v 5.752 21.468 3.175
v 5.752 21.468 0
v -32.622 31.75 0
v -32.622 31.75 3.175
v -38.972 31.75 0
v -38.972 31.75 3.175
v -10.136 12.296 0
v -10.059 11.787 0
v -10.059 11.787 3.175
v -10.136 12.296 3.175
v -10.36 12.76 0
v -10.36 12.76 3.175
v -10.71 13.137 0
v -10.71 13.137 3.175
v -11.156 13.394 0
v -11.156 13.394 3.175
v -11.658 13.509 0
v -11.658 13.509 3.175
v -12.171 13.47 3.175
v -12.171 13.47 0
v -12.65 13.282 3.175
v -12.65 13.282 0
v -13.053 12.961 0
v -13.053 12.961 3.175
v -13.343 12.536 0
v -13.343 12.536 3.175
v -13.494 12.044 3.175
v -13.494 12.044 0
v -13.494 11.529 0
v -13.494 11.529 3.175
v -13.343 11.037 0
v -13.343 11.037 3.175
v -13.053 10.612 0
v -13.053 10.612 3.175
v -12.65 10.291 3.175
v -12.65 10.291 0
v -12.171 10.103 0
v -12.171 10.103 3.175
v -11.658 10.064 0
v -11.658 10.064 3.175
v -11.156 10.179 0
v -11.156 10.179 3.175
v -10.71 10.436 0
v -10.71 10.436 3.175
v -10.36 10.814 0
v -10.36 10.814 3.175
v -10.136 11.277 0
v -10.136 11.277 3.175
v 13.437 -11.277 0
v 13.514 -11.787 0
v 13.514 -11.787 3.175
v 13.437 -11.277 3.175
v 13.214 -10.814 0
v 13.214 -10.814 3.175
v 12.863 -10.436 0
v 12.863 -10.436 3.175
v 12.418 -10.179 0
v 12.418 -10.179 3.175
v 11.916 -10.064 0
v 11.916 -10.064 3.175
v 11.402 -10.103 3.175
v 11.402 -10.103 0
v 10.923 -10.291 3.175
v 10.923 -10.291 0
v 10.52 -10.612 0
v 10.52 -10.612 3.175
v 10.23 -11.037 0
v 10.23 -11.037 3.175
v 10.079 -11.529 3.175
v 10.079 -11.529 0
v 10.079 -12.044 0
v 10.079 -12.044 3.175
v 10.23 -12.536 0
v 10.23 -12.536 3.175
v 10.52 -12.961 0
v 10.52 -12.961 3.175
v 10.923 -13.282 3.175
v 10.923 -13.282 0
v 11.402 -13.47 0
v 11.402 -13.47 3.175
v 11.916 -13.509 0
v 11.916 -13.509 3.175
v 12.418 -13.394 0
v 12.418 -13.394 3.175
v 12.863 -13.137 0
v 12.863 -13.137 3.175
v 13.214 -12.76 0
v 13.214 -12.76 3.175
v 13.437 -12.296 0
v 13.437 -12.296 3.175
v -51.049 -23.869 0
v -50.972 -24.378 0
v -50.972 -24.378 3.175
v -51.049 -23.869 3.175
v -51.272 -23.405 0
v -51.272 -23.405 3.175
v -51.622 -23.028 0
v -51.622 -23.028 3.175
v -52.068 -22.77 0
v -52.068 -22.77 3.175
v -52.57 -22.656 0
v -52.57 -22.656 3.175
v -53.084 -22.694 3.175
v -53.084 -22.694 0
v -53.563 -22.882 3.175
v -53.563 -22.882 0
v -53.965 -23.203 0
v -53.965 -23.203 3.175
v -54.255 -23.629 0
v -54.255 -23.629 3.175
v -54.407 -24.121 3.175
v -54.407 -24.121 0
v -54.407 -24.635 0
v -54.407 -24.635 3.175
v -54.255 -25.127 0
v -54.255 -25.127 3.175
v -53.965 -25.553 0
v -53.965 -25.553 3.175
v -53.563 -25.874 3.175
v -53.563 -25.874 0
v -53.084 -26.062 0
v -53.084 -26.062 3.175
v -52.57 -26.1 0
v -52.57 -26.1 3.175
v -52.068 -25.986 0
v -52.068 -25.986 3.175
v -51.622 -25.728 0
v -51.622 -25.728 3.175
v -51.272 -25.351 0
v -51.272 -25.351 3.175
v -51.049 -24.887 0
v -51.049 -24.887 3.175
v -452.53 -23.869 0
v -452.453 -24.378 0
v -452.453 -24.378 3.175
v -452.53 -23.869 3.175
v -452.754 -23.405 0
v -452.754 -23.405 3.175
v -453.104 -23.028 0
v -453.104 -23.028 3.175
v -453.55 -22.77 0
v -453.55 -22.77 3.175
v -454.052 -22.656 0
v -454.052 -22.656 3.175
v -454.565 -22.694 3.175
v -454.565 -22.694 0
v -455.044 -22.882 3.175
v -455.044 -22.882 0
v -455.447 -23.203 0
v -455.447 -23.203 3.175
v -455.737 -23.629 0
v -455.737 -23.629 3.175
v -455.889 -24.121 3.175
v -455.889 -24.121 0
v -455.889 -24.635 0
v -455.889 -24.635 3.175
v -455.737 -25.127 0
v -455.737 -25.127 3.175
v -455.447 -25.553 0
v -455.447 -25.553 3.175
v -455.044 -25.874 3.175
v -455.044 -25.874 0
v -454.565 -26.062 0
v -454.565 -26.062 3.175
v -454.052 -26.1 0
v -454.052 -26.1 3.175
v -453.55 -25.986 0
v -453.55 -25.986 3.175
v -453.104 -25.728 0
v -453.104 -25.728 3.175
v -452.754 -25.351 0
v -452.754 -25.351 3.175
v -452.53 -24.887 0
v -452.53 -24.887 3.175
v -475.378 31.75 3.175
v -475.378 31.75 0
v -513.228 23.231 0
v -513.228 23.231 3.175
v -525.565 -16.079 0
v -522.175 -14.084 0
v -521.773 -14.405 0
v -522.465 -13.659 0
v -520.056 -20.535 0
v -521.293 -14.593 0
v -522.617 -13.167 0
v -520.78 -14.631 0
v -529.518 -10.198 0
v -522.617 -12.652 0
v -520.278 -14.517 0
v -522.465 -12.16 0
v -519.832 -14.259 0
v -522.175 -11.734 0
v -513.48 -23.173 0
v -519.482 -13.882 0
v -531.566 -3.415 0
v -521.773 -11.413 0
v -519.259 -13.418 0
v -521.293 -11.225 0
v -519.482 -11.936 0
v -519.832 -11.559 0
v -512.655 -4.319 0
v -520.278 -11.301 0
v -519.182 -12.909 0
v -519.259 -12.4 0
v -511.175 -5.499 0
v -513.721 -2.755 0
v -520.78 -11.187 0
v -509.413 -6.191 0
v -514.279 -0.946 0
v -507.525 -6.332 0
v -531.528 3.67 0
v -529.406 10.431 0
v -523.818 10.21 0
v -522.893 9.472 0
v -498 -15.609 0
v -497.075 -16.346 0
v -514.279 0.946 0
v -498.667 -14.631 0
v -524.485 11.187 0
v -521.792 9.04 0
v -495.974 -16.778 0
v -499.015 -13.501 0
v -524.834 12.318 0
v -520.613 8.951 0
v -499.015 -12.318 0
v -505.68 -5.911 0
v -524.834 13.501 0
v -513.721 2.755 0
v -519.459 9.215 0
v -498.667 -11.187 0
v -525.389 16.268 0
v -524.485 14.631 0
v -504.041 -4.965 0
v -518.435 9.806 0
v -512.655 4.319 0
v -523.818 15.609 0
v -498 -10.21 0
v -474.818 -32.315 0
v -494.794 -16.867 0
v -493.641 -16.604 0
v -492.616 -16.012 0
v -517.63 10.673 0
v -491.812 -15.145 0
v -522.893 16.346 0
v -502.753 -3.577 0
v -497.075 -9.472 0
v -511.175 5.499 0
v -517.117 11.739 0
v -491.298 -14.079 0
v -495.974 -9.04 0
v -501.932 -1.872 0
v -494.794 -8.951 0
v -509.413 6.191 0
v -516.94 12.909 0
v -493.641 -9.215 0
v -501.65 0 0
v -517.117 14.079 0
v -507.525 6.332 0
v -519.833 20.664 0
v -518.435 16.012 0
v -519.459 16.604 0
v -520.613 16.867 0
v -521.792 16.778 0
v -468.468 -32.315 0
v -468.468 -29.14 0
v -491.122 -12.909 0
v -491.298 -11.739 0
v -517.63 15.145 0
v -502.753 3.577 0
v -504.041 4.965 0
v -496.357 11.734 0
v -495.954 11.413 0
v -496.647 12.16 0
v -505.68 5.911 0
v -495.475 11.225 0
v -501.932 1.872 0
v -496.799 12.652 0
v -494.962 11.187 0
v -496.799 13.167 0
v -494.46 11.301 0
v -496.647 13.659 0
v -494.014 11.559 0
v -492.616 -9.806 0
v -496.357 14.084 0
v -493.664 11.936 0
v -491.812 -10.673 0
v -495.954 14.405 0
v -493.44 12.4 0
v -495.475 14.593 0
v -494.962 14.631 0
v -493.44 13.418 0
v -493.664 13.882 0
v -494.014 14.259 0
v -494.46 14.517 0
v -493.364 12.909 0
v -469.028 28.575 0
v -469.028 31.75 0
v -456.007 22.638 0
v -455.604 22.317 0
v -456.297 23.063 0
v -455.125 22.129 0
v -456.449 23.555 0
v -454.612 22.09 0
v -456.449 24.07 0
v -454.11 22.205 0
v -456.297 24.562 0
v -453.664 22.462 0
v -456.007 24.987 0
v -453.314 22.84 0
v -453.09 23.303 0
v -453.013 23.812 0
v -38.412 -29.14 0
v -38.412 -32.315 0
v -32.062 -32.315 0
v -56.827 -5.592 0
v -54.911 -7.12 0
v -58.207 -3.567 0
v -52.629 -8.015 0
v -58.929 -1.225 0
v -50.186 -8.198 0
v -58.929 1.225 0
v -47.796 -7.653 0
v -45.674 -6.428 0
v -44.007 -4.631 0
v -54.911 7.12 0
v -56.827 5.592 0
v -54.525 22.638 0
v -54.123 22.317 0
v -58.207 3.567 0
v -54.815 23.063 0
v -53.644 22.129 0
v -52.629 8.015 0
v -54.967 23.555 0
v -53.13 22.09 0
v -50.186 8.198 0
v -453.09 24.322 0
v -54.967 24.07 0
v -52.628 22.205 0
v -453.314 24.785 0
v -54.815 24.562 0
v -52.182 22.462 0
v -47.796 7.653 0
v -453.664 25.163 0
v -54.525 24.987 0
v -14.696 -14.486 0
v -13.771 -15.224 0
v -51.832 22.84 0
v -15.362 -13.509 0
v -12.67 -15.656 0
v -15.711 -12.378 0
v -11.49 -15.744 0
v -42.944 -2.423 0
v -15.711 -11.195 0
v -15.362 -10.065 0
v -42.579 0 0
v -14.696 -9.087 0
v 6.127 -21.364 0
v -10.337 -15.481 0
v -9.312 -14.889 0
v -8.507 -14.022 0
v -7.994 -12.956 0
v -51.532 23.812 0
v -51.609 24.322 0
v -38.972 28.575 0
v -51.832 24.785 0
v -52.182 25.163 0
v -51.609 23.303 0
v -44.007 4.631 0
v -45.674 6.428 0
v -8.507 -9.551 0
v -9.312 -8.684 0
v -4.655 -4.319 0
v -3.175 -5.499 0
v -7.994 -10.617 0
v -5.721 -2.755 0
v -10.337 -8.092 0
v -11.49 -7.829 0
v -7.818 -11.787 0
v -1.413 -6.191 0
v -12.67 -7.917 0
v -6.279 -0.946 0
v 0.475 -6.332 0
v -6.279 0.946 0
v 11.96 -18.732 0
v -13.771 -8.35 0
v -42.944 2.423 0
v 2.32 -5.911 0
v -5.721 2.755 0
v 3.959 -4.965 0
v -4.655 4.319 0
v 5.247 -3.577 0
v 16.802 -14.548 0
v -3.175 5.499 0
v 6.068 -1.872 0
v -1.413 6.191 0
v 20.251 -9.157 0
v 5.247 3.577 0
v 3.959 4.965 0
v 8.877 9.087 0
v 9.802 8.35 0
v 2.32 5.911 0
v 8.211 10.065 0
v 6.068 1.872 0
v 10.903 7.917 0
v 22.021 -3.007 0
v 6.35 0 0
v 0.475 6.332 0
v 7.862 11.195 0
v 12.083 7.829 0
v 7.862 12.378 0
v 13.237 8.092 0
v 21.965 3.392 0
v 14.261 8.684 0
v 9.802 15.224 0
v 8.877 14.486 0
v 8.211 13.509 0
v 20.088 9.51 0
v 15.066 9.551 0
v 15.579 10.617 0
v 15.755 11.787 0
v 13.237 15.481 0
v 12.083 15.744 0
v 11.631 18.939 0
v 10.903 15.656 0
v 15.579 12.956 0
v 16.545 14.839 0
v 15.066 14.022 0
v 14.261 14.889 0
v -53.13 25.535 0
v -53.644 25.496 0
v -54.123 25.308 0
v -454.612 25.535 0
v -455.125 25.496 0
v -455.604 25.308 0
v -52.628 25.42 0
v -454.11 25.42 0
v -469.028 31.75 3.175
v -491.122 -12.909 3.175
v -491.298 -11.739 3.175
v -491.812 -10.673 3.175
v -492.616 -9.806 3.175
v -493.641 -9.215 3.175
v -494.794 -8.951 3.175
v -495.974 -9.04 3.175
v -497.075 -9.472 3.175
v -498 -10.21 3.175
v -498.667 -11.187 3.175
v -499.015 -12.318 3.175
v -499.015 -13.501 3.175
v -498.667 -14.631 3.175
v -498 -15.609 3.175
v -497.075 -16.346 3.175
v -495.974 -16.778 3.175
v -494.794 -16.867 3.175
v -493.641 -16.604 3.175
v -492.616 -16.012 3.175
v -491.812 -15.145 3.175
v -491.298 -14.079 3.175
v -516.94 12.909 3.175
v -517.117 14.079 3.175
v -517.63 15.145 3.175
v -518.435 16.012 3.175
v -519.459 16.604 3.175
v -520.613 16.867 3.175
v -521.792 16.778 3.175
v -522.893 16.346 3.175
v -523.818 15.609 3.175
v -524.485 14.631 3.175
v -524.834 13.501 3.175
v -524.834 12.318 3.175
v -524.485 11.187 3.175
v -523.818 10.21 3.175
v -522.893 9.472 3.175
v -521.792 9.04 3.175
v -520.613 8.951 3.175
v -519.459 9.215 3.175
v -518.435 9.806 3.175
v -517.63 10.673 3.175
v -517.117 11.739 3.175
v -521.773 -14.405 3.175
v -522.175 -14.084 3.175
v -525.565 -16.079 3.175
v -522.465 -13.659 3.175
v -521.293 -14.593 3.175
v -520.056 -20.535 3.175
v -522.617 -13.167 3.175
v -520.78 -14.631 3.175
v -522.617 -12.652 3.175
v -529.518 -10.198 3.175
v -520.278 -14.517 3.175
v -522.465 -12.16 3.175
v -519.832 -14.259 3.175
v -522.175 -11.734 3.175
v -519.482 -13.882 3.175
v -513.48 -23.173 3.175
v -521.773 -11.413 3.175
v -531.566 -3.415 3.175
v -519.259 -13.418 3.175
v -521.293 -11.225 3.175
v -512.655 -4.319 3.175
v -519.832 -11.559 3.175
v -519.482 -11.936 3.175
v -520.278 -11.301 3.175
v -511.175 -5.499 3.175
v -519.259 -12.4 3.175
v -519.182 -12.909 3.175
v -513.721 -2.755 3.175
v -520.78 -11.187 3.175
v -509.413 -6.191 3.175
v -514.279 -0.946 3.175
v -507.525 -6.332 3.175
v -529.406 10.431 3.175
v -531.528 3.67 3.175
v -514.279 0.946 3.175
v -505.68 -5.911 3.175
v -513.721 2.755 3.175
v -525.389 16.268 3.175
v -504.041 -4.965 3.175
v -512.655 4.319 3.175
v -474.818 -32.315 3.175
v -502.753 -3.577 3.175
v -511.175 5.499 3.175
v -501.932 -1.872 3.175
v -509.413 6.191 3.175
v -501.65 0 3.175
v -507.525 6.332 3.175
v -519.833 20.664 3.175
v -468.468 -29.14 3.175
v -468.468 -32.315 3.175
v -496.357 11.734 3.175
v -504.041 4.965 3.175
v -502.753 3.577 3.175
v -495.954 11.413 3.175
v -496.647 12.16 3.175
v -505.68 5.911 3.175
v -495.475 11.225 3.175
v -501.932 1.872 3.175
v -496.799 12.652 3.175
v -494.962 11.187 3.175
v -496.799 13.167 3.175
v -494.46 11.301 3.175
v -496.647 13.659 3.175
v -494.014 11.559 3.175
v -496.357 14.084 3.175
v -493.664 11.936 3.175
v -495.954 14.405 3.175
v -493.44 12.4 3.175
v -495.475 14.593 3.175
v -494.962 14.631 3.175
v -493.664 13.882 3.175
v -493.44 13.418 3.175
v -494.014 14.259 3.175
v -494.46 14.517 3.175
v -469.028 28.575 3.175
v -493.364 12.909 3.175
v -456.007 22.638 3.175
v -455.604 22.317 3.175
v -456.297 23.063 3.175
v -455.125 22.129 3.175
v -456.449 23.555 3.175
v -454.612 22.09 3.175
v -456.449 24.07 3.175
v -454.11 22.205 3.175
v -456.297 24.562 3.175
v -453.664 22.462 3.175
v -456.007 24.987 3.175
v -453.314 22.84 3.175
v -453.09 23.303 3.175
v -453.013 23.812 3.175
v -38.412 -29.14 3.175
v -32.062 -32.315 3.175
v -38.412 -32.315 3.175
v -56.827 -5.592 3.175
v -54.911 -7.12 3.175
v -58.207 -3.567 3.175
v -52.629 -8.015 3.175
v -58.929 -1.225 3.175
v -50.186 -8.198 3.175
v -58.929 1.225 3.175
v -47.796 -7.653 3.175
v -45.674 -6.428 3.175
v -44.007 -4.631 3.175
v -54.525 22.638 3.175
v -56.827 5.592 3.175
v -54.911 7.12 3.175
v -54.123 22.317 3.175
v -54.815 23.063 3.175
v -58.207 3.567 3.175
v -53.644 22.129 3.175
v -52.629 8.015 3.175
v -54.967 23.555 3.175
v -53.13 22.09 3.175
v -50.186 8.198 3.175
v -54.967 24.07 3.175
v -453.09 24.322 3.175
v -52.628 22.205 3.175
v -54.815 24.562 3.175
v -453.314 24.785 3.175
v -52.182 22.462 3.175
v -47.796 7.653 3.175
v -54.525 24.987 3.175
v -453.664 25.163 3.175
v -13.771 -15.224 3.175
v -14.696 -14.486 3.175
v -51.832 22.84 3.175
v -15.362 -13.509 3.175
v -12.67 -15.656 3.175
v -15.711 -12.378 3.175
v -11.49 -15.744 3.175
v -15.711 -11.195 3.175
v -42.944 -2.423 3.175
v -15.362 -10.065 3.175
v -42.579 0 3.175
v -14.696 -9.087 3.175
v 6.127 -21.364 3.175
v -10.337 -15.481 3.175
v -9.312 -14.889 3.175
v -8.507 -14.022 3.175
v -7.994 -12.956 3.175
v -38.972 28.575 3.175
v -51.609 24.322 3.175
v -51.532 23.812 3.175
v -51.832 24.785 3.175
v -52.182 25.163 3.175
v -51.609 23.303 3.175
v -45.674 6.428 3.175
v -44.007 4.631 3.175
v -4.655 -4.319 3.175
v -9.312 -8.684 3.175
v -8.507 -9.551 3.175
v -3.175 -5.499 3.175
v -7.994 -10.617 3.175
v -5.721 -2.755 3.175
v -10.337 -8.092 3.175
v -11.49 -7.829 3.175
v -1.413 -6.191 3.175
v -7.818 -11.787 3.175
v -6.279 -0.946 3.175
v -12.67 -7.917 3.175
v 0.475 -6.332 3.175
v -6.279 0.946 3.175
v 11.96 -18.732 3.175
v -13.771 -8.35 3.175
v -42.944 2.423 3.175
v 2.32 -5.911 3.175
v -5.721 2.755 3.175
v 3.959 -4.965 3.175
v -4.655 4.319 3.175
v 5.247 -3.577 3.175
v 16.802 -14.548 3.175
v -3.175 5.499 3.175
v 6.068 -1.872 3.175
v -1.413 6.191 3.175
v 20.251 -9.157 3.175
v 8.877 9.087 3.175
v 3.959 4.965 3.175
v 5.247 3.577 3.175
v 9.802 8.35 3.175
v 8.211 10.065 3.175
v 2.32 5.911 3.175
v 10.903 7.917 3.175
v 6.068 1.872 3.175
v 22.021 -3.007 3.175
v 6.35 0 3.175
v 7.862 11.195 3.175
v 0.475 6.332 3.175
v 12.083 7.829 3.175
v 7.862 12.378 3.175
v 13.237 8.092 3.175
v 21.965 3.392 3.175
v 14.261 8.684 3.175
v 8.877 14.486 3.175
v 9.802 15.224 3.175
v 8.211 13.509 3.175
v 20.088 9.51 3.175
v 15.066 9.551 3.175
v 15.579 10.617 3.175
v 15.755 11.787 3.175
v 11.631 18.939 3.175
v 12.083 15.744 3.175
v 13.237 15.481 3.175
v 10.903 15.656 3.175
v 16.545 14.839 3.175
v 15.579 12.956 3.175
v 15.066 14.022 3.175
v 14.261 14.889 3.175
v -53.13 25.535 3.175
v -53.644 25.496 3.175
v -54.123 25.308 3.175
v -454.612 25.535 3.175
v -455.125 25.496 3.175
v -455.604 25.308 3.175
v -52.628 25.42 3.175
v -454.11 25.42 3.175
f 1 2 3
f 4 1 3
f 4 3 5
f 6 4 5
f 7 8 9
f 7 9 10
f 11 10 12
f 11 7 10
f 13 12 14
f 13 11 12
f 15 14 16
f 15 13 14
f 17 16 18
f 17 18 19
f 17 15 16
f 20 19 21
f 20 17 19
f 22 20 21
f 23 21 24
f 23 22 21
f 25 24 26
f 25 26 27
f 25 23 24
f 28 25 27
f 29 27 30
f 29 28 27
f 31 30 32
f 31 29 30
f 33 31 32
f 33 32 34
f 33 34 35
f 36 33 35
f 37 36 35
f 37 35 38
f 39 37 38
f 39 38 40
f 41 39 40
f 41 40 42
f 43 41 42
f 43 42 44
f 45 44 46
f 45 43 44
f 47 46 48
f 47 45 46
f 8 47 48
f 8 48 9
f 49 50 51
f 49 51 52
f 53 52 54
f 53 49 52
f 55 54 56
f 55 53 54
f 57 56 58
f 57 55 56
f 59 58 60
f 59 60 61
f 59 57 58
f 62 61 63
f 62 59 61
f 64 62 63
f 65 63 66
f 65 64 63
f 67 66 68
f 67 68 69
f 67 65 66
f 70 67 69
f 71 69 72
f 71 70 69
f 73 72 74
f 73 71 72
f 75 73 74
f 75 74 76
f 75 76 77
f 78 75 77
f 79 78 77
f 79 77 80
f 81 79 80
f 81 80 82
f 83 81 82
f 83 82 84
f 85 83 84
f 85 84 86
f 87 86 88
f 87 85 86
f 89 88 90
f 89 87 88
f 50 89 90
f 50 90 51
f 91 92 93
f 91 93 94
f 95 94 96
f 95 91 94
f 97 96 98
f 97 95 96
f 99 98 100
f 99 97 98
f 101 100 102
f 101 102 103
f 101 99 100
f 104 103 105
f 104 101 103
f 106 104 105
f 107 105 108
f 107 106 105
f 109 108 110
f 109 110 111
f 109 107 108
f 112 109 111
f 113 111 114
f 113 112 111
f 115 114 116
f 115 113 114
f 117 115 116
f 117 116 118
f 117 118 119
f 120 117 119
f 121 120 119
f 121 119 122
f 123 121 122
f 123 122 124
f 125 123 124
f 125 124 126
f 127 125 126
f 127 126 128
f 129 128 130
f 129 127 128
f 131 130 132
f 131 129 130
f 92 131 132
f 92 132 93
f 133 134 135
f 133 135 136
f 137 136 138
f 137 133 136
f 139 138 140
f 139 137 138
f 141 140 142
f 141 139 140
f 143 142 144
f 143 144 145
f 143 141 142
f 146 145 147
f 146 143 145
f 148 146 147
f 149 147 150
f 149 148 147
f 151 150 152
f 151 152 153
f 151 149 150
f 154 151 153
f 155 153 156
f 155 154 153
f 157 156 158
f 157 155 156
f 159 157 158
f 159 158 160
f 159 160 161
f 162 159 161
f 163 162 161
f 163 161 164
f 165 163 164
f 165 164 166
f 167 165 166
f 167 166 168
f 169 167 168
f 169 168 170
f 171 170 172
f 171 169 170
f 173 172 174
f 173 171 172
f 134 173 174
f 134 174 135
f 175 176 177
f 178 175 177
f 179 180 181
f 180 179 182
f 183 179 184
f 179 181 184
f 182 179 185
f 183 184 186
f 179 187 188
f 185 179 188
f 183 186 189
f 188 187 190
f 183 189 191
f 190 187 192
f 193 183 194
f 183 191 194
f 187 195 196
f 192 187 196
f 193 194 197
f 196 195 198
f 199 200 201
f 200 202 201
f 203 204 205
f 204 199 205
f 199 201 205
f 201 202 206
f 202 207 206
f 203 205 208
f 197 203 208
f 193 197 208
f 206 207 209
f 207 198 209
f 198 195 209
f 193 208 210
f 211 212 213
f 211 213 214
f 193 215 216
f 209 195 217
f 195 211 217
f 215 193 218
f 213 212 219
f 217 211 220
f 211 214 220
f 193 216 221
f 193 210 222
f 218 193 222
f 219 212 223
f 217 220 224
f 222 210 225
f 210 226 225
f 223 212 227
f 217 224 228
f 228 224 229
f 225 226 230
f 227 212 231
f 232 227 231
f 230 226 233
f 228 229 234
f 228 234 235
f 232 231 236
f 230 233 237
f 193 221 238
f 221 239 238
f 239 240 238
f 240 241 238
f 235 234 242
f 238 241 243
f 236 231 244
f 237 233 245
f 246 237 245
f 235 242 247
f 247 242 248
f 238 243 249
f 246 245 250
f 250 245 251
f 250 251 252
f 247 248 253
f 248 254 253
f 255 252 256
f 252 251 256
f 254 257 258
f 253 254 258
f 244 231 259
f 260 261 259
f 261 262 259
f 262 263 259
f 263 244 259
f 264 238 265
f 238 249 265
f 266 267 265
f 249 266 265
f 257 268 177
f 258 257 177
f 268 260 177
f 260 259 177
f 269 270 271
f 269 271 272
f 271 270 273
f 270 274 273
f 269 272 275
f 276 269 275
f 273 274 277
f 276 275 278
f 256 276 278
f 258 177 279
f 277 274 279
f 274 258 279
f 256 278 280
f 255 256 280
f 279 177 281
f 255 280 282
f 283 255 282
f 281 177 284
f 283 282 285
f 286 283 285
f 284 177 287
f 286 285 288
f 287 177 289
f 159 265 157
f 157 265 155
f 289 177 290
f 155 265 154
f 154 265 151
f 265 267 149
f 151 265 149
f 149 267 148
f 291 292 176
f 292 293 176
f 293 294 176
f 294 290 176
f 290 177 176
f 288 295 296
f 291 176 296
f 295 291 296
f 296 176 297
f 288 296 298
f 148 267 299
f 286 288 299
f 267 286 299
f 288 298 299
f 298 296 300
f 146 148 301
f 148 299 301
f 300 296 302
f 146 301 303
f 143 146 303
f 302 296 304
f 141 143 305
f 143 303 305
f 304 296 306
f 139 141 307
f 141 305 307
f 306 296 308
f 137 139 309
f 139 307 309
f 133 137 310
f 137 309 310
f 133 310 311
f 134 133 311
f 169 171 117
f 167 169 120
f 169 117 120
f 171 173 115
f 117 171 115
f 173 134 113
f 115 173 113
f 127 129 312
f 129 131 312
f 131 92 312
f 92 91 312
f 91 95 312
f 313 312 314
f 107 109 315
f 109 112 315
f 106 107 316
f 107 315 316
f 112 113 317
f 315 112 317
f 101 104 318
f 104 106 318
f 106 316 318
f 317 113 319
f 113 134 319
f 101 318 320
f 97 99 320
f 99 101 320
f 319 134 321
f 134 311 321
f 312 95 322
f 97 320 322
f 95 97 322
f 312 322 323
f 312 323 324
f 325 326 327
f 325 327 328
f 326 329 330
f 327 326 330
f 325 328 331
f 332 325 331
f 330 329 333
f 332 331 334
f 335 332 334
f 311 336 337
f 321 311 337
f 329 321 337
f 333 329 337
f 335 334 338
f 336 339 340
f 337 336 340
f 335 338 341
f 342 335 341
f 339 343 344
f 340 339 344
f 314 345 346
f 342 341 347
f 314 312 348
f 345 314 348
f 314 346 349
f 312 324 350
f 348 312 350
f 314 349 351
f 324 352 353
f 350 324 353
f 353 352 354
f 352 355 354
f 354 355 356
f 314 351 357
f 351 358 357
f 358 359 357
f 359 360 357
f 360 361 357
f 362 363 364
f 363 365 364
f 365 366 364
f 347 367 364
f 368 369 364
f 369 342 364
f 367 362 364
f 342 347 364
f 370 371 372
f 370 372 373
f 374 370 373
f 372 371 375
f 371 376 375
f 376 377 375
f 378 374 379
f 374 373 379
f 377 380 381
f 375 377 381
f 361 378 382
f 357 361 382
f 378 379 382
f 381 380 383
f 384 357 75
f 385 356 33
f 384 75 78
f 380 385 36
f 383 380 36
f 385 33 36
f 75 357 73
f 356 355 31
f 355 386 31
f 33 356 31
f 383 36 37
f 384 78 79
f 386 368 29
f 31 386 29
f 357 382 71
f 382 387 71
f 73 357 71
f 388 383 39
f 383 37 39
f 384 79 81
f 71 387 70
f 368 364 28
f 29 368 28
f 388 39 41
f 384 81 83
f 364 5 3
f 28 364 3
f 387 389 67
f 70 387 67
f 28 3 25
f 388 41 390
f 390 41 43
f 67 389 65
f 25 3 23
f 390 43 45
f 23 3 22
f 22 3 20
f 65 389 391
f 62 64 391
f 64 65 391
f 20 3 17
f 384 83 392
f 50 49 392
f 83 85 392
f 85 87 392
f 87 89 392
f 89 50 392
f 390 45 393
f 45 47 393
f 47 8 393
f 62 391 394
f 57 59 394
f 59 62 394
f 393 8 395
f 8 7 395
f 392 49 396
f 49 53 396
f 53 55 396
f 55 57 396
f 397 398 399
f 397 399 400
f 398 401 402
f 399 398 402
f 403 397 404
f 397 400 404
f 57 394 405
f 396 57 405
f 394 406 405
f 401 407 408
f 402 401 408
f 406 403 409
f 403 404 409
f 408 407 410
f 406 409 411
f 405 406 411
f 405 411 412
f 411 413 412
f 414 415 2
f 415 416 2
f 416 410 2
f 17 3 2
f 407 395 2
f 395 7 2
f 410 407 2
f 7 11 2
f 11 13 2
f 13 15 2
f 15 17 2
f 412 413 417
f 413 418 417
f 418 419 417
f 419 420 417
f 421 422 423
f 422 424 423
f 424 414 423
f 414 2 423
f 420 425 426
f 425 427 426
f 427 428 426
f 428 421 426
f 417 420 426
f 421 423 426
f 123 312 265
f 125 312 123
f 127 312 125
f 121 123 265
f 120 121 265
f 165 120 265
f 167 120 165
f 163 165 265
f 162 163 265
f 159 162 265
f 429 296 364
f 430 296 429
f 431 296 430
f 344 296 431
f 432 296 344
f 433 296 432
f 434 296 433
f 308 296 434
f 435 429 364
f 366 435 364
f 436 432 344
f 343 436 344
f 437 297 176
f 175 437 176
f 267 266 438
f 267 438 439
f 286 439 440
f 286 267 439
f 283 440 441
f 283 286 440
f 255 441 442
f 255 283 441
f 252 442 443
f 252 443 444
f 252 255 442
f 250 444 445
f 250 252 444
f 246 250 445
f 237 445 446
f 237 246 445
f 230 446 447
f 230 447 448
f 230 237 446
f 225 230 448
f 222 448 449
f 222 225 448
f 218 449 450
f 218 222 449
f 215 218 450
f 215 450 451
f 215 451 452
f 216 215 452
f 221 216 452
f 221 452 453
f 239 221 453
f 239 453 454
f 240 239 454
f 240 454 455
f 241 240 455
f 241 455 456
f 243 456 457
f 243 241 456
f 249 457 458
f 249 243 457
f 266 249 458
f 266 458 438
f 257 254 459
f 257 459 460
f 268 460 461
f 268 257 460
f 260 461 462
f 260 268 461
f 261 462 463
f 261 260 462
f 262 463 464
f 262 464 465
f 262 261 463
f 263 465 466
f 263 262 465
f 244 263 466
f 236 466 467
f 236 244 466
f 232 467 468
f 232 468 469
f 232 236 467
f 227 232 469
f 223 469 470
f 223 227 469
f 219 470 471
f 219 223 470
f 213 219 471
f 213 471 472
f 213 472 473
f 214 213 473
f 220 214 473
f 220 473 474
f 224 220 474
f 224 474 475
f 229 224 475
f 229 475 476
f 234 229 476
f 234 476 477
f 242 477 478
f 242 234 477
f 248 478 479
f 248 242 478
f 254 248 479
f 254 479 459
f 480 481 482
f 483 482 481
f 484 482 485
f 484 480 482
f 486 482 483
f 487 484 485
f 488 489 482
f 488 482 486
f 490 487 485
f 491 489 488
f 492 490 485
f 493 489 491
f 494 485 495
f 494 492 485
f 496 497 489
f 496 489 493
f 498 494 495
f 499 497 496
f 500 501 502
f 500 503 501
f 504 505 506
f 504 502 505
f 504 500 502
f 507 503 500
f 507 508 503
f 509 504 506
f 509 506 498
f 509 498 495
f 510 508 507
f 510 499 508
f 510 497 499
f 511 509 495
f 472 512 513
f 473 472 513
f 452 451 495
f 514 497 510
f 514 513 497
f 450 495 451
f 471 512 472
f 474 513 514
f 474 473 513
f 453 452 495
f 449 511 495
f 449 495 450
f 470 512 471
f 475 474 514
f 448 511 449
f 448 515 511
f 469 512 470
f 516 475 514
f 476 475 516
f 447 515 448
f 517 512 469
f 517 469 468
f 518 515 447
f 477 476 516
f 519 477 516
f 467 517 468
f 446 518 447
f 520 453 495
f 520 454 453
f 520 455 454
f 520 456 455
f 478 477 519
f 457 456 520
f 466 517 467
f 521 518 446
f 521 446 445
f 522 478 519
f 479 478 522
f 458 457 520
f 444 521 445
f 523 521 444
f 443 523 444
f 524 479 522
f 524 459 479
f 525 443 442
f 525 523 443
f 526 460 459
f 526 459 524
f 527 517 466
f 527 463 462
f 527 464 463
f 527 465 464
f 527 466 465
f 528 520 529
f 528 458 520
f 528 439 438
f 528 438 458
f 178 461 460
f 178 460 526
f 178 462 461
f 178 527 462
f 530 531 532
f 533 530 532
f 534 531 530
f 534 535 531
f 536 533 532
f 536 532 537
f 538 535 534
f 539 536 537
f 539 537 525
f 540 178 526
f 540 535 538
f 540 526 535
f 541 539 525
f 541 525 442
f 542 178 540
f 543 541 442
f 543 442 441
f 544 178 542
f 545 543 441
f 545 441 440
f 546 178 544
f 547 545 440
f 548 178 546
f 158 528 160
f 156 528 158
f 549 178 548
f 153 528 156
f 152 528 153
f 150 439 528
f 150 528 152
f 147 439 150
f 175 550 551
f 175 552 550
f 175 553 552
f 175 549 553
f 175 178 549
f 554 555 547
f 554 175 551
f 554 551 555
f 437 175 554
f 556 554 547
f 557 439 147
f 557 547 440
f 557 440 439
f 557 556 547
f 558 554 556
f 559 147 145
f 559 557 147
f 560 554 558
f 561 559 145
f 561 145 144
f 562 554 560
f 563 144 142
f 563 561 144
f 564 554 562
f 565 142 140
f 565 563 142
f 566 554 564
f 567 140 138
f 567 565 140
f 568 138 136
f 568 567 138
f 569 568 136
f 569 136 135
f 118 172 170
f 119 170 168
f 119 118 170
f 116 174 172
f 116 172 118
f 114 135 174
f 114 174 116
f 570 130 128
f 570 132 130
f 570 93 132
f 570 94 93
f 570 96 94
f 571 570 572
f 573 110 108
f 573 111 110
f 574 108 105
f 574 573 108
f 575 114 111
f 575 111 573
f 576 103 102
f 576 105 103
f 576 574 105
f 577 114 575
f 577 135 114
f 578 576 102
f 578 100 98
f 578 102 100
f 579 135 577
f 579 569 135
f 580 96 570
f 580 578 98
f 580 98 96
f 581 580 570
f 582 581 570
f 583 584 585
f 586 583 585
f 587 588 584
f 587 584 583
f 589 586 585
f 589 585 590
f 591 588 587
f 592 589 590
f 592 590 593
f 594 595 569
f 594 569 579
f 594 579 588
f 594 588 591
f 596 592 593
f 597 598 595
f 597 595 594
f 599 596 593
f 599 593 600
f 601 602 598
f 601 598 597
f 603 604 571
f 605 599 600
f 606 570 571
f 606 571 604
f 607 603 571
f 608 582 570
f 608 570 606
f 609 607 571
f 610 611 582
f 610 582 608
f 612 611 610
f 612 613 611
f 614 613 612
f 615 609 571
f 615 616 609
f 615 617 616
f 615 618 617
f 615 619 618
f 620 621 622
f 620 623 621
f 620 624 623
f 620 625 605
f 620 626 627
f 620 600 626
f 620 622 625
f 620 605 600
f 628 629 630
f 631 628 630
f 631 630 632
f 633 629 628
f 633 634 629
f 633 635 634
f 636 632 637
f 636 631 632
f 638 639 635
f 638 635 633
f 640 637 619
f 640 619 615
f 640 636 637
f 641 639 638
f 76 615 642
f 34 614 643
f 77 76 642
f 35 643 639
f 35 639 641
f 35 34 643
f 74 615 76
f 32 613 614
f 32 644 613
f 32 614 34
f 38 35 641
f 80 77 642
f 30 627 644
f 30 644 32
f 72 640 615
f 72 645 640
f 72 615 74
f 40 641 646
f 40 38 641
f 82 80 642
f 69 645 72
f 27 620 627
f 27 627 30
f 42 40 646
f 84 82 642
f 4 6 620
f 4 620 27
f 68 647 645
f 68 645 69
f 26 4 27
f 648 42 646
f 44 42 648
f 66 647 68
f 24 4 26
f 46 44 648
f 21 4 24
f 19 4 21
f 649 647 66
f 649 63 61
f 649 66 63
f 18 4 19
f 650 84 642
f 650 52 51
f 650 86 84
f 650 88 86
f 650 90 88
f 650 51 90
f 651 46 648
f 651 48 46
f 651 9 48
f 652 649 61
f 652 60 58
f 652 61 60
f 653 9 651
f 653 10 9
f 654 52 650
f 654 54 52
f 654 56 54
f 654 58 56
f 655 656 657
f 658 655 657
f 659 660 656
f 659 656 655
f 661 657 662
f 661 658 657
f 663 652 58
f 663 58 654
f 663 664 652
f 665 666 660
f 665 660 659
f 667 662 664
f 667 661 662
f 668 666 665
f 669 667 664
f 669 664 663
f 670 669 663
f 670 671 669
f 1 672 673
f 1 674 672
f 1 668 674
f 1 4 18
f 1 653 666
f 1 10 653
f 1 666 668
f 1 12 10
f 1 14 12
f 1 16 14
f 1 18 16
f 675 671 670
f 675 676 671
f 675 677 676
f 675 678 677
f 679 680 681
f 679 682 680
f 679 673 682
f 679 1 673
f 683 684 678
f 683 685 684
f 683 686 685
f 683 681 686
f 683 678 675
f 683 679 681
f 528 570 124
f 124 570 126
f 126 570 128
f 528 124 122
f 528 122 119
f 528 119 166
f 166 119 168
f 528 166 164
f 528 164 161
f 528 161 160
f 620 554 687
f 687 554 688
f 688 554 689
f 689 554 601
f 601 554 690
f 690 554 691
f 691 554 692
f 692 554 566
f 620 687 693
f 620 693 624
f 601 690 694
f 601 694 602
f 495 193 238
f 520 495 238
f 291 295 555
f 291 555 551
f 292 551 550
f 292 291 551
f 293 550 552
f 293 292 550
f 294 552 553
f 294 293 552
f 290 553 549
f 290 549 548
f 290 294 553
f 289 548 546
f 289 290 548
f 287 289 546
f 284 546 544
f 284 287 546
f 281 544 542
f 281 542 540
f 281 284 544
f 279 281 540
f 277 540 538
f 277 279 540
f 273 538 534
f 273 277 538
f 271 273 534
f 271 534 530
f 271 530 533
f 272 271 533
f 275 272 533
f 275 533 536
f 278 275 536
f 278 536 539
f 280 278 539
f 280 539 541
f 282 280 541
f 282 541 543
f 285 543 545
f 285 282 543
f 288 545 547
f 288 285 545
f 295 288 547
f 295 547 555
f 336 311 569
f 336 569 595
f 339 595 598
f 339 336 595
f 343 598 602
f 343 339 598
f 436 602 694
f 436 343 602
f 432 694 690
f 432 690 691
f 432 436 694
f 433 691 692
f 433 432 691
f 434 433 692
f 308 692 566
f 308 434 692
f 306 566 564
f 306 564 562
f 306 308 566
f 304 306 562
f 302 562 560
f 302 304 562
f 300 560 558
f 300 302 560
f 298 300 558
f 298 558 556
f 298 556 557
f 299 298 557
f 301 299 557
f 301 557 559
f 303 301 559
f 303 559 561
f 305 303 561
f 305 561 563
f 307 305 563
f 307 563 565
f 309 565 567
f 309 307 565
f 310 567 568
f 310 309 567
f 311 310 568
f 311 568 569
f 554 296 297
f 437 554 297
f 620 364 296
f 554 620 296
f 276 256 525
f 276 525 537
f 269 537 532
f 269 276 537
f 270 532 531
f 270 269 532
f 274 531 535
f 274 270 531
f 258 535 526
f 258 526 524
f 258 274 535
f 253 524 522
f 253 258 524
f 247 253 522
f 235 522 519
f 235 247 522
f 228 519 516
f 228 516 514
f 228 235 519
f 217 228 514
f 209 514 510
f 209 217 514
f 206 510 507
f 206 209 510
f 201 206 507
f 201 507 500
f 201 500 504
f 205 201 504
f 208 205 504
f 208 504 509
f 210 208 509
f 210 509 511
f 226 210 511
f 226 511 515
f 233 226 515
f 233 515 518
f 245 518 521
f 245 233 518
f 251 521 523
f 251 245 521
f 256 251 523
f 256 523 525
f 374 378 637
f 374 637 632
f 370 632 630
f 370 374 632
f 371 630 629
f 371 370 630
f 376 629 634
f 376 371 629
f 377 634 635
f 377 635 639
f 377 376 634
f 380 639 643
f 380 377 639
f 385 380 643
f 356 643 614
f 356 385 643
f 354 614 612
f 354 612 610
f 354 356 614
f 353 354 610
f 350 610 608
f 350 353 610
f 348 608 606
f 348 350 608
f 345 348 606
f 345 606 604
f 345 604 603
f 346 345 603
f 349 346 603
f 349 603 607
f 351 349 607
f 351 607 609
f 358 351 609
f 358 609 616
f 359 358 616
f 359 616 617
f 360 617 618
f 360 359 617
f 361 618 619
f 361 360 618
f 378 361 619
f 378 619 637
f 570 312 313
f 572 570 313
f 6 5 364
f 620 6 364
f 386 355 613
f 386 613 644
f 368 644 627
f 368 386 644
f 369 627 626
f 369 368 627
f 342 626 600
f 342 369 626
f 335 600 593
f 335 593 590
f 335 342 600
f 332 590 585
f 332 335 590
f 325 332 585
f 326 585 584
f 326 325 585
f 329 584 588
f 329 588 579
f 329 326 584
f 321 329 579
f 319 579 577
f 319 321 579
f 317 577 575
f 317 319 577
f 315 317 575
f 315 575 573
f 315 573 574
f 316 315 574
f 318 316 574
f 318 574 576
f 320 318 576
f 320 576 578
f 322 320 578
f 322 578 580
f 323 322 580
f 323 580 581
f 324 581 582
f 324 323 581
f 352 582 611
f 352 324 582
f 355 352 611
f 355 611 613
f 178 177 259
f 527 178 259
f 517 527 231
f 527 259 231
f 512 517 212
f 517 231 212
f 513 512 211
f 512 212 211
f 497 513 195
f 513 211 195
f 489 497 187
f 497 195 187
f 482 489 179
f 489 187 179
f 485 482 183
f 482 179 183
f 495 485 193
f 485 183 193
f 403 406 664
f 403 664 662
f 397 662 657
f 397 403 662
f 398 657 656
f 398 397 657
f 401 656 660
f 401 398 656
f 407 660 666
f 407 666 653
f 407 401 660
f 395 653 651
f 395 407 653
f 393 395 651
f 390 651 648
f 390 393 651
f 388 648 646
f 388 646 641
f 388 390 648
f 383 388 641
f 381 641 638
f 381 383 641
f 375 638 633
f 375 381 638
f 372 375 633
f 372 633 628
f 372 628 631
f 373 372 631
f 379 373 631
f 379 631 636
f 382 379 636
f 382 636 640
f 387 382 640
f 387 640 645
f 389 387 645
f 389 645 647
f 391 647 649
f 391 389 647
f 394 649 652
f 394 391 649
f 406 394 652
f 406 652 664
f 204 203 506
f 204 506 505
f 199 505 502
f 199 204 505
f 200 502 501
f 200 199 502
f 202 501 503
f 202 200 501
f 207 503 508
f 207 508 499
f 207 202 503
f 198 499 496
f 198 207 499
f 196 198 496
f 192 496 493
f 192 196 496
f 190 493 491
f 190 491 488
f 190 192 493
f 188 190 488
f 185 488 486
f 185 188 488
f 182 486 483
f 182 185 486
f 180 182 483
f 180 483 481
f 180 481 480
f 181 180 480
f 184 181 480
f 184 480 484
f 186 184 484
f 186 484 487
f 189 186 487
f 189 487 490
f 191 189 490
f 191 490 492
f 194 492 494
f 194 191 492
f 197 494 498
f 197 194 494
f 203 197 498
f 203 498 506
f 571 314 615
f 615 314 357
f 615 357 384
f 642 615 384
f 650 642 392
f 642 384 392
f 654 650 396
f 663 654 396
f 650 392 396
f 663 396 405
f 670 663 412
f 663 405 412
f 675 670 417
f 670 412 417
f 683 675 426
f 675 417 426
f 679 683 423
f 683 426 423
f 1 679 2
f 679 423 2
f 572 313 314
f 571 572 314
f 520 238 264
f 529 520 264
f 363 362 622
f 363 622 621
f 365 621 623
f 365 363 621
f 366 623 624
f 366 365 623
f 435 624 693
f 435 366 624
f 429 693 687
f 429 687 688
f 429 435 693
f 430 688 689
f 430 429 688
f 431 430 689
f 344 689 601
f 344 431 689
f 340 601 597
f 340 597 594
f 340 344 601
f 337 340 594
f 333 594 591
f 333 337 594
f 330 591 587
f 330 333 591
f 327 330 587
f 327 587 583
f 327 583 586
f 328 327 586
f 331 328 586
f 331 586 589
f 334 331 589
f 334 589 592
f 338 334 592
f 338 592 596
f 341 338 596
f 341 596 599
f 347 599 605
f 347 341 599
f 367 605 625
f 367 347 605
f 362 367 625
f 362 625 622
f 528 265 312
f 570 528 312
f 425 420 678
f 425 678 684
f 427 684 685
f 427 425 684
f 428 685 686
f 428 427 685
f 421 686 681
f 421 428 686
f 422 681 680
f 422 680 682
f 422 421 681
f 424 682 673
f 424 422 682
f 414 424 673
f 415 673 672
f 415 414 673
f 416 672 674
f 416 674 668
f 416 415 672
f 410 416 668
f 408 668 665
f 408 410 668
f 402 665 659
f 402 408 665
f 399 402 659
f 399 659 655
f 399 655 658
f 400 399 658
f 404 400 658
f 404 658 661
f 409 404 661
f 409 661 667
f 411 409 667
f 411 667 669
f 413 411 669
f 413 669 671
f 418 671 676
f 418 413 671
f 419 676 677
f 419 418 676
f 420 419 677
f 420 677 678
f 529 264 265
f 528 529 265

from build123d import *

# Parameters (mm, degrees)
F0_R     = 1.7272
F0_R_2   = 3.96875
F0_R_3   = 6.35
F0_R_4   = 8.221183
F1_DEPTH = 3.175


with BuildPart() as f1:
    # F0 (on Top) → F1 (new body)
    with BuildSketch(Plane.XY):
        with BuildLine():
            Line((-475.378193, 31.75), (-513.228467, 23.231407))
            ThreePointArc((-513.228467, 23.231407), (-531.812151, 0.128904), (-513.479674, -23.17344))
            Line((-513.479674, -23.17344), (-474.818103, -32.315493))
            Line((-474.818103, -32.315493), (-468.468103, -32.315493))
            Line((-468.468103, -32.315493), (-468.468103, -29.140493))
            Line((-468.468103, -29.140493), (-38.411718, -29.140493))
            Line((-38.411718, -29.140493), (-38.411718, -32.315493))
            Line((-38.411718, -32.315493), (-32.061718, -32.315493))
            Line((-32.061718, -32.315493), (6.126706, -21.36385))
            ThreePointArc((6.126706, -21.36385), (22.224151, 0.194294), (5.752253, 21.467701))
            Line((5.752253, 21.467701), (-32.621807, 31.75))
            Line((-32.621807, 31.75), (-38.971807, 31.75))
            Line((-38.971807, 31.75), (-38.971807, 28.575))
            Line((-38.971807, 28.575), (-469.028193, 28.575))
            Line((-469.028193, 28.575), (-469.028193, 31.75))
            Line((-469.028193, 31.75), (-475.378193, 31.75))
        make_face()
        with Locations((-454.180603, -24.377993)):
            Circle(F0_R, mode=Mode.SUBTRACT)
        with Locations((-520.909118, -12.909118)):
            Circle(F0_R, mode=Mode.SUBTRACT)
        with Locations((-495.090882, -12.909118)):
            Circle(F0_R_2, mode=Mode.SUBTRACT)
        with Locations((-52.699218, -24.377993)):
            Circle(F0_R, mode=Mode.SUBTRACT)
        with Locations((-11.786586, -11.786586)):
            Circle(F0_R_2, mode=Mode.SUBTRACT)
        with Locations((11.786586, -11.786586)):
            Circle(F0_R, mode=Mode.SUBTRACT)
        with Locations((-508, 0)):
            Circle(F0_R_3, mode=Mode.SUBTRACT)
        with Locations((-520.909118, 12.909118)):
            Circle(F0_R_2, mode=Mode.SUBTRACT)
        with Locations((-495.090882, 12.909118)):
            Circle(F0_R, mode=Mode.SUBTRACT)
        with Locations((-454.740693, 23.8125)):
            Circle(F0_R, mode=Mode.SUBTRACT)
        with Locations((-50.8, 0)):
            Circle(F0_R_4, mode=Mode.SUBTRACT)
        Circle(F0_R_3, mode=Mode.SUBTRACT)
        with Locations((-11.786586, 11.786586)):
            Circle(F0_R, mode=Mode.SUBTRACT)
        with Locations((11.786586, 11.786586)):
            Circle(F0_R_2, mode=Mode.SUBTRACT)
        with Locations((-53.259307, 23.8125)):
            Circle(F0_R, mode=Mode.SUBTRACT)
    extrude(amount=F1_DEPTH)


solid = f1.part
